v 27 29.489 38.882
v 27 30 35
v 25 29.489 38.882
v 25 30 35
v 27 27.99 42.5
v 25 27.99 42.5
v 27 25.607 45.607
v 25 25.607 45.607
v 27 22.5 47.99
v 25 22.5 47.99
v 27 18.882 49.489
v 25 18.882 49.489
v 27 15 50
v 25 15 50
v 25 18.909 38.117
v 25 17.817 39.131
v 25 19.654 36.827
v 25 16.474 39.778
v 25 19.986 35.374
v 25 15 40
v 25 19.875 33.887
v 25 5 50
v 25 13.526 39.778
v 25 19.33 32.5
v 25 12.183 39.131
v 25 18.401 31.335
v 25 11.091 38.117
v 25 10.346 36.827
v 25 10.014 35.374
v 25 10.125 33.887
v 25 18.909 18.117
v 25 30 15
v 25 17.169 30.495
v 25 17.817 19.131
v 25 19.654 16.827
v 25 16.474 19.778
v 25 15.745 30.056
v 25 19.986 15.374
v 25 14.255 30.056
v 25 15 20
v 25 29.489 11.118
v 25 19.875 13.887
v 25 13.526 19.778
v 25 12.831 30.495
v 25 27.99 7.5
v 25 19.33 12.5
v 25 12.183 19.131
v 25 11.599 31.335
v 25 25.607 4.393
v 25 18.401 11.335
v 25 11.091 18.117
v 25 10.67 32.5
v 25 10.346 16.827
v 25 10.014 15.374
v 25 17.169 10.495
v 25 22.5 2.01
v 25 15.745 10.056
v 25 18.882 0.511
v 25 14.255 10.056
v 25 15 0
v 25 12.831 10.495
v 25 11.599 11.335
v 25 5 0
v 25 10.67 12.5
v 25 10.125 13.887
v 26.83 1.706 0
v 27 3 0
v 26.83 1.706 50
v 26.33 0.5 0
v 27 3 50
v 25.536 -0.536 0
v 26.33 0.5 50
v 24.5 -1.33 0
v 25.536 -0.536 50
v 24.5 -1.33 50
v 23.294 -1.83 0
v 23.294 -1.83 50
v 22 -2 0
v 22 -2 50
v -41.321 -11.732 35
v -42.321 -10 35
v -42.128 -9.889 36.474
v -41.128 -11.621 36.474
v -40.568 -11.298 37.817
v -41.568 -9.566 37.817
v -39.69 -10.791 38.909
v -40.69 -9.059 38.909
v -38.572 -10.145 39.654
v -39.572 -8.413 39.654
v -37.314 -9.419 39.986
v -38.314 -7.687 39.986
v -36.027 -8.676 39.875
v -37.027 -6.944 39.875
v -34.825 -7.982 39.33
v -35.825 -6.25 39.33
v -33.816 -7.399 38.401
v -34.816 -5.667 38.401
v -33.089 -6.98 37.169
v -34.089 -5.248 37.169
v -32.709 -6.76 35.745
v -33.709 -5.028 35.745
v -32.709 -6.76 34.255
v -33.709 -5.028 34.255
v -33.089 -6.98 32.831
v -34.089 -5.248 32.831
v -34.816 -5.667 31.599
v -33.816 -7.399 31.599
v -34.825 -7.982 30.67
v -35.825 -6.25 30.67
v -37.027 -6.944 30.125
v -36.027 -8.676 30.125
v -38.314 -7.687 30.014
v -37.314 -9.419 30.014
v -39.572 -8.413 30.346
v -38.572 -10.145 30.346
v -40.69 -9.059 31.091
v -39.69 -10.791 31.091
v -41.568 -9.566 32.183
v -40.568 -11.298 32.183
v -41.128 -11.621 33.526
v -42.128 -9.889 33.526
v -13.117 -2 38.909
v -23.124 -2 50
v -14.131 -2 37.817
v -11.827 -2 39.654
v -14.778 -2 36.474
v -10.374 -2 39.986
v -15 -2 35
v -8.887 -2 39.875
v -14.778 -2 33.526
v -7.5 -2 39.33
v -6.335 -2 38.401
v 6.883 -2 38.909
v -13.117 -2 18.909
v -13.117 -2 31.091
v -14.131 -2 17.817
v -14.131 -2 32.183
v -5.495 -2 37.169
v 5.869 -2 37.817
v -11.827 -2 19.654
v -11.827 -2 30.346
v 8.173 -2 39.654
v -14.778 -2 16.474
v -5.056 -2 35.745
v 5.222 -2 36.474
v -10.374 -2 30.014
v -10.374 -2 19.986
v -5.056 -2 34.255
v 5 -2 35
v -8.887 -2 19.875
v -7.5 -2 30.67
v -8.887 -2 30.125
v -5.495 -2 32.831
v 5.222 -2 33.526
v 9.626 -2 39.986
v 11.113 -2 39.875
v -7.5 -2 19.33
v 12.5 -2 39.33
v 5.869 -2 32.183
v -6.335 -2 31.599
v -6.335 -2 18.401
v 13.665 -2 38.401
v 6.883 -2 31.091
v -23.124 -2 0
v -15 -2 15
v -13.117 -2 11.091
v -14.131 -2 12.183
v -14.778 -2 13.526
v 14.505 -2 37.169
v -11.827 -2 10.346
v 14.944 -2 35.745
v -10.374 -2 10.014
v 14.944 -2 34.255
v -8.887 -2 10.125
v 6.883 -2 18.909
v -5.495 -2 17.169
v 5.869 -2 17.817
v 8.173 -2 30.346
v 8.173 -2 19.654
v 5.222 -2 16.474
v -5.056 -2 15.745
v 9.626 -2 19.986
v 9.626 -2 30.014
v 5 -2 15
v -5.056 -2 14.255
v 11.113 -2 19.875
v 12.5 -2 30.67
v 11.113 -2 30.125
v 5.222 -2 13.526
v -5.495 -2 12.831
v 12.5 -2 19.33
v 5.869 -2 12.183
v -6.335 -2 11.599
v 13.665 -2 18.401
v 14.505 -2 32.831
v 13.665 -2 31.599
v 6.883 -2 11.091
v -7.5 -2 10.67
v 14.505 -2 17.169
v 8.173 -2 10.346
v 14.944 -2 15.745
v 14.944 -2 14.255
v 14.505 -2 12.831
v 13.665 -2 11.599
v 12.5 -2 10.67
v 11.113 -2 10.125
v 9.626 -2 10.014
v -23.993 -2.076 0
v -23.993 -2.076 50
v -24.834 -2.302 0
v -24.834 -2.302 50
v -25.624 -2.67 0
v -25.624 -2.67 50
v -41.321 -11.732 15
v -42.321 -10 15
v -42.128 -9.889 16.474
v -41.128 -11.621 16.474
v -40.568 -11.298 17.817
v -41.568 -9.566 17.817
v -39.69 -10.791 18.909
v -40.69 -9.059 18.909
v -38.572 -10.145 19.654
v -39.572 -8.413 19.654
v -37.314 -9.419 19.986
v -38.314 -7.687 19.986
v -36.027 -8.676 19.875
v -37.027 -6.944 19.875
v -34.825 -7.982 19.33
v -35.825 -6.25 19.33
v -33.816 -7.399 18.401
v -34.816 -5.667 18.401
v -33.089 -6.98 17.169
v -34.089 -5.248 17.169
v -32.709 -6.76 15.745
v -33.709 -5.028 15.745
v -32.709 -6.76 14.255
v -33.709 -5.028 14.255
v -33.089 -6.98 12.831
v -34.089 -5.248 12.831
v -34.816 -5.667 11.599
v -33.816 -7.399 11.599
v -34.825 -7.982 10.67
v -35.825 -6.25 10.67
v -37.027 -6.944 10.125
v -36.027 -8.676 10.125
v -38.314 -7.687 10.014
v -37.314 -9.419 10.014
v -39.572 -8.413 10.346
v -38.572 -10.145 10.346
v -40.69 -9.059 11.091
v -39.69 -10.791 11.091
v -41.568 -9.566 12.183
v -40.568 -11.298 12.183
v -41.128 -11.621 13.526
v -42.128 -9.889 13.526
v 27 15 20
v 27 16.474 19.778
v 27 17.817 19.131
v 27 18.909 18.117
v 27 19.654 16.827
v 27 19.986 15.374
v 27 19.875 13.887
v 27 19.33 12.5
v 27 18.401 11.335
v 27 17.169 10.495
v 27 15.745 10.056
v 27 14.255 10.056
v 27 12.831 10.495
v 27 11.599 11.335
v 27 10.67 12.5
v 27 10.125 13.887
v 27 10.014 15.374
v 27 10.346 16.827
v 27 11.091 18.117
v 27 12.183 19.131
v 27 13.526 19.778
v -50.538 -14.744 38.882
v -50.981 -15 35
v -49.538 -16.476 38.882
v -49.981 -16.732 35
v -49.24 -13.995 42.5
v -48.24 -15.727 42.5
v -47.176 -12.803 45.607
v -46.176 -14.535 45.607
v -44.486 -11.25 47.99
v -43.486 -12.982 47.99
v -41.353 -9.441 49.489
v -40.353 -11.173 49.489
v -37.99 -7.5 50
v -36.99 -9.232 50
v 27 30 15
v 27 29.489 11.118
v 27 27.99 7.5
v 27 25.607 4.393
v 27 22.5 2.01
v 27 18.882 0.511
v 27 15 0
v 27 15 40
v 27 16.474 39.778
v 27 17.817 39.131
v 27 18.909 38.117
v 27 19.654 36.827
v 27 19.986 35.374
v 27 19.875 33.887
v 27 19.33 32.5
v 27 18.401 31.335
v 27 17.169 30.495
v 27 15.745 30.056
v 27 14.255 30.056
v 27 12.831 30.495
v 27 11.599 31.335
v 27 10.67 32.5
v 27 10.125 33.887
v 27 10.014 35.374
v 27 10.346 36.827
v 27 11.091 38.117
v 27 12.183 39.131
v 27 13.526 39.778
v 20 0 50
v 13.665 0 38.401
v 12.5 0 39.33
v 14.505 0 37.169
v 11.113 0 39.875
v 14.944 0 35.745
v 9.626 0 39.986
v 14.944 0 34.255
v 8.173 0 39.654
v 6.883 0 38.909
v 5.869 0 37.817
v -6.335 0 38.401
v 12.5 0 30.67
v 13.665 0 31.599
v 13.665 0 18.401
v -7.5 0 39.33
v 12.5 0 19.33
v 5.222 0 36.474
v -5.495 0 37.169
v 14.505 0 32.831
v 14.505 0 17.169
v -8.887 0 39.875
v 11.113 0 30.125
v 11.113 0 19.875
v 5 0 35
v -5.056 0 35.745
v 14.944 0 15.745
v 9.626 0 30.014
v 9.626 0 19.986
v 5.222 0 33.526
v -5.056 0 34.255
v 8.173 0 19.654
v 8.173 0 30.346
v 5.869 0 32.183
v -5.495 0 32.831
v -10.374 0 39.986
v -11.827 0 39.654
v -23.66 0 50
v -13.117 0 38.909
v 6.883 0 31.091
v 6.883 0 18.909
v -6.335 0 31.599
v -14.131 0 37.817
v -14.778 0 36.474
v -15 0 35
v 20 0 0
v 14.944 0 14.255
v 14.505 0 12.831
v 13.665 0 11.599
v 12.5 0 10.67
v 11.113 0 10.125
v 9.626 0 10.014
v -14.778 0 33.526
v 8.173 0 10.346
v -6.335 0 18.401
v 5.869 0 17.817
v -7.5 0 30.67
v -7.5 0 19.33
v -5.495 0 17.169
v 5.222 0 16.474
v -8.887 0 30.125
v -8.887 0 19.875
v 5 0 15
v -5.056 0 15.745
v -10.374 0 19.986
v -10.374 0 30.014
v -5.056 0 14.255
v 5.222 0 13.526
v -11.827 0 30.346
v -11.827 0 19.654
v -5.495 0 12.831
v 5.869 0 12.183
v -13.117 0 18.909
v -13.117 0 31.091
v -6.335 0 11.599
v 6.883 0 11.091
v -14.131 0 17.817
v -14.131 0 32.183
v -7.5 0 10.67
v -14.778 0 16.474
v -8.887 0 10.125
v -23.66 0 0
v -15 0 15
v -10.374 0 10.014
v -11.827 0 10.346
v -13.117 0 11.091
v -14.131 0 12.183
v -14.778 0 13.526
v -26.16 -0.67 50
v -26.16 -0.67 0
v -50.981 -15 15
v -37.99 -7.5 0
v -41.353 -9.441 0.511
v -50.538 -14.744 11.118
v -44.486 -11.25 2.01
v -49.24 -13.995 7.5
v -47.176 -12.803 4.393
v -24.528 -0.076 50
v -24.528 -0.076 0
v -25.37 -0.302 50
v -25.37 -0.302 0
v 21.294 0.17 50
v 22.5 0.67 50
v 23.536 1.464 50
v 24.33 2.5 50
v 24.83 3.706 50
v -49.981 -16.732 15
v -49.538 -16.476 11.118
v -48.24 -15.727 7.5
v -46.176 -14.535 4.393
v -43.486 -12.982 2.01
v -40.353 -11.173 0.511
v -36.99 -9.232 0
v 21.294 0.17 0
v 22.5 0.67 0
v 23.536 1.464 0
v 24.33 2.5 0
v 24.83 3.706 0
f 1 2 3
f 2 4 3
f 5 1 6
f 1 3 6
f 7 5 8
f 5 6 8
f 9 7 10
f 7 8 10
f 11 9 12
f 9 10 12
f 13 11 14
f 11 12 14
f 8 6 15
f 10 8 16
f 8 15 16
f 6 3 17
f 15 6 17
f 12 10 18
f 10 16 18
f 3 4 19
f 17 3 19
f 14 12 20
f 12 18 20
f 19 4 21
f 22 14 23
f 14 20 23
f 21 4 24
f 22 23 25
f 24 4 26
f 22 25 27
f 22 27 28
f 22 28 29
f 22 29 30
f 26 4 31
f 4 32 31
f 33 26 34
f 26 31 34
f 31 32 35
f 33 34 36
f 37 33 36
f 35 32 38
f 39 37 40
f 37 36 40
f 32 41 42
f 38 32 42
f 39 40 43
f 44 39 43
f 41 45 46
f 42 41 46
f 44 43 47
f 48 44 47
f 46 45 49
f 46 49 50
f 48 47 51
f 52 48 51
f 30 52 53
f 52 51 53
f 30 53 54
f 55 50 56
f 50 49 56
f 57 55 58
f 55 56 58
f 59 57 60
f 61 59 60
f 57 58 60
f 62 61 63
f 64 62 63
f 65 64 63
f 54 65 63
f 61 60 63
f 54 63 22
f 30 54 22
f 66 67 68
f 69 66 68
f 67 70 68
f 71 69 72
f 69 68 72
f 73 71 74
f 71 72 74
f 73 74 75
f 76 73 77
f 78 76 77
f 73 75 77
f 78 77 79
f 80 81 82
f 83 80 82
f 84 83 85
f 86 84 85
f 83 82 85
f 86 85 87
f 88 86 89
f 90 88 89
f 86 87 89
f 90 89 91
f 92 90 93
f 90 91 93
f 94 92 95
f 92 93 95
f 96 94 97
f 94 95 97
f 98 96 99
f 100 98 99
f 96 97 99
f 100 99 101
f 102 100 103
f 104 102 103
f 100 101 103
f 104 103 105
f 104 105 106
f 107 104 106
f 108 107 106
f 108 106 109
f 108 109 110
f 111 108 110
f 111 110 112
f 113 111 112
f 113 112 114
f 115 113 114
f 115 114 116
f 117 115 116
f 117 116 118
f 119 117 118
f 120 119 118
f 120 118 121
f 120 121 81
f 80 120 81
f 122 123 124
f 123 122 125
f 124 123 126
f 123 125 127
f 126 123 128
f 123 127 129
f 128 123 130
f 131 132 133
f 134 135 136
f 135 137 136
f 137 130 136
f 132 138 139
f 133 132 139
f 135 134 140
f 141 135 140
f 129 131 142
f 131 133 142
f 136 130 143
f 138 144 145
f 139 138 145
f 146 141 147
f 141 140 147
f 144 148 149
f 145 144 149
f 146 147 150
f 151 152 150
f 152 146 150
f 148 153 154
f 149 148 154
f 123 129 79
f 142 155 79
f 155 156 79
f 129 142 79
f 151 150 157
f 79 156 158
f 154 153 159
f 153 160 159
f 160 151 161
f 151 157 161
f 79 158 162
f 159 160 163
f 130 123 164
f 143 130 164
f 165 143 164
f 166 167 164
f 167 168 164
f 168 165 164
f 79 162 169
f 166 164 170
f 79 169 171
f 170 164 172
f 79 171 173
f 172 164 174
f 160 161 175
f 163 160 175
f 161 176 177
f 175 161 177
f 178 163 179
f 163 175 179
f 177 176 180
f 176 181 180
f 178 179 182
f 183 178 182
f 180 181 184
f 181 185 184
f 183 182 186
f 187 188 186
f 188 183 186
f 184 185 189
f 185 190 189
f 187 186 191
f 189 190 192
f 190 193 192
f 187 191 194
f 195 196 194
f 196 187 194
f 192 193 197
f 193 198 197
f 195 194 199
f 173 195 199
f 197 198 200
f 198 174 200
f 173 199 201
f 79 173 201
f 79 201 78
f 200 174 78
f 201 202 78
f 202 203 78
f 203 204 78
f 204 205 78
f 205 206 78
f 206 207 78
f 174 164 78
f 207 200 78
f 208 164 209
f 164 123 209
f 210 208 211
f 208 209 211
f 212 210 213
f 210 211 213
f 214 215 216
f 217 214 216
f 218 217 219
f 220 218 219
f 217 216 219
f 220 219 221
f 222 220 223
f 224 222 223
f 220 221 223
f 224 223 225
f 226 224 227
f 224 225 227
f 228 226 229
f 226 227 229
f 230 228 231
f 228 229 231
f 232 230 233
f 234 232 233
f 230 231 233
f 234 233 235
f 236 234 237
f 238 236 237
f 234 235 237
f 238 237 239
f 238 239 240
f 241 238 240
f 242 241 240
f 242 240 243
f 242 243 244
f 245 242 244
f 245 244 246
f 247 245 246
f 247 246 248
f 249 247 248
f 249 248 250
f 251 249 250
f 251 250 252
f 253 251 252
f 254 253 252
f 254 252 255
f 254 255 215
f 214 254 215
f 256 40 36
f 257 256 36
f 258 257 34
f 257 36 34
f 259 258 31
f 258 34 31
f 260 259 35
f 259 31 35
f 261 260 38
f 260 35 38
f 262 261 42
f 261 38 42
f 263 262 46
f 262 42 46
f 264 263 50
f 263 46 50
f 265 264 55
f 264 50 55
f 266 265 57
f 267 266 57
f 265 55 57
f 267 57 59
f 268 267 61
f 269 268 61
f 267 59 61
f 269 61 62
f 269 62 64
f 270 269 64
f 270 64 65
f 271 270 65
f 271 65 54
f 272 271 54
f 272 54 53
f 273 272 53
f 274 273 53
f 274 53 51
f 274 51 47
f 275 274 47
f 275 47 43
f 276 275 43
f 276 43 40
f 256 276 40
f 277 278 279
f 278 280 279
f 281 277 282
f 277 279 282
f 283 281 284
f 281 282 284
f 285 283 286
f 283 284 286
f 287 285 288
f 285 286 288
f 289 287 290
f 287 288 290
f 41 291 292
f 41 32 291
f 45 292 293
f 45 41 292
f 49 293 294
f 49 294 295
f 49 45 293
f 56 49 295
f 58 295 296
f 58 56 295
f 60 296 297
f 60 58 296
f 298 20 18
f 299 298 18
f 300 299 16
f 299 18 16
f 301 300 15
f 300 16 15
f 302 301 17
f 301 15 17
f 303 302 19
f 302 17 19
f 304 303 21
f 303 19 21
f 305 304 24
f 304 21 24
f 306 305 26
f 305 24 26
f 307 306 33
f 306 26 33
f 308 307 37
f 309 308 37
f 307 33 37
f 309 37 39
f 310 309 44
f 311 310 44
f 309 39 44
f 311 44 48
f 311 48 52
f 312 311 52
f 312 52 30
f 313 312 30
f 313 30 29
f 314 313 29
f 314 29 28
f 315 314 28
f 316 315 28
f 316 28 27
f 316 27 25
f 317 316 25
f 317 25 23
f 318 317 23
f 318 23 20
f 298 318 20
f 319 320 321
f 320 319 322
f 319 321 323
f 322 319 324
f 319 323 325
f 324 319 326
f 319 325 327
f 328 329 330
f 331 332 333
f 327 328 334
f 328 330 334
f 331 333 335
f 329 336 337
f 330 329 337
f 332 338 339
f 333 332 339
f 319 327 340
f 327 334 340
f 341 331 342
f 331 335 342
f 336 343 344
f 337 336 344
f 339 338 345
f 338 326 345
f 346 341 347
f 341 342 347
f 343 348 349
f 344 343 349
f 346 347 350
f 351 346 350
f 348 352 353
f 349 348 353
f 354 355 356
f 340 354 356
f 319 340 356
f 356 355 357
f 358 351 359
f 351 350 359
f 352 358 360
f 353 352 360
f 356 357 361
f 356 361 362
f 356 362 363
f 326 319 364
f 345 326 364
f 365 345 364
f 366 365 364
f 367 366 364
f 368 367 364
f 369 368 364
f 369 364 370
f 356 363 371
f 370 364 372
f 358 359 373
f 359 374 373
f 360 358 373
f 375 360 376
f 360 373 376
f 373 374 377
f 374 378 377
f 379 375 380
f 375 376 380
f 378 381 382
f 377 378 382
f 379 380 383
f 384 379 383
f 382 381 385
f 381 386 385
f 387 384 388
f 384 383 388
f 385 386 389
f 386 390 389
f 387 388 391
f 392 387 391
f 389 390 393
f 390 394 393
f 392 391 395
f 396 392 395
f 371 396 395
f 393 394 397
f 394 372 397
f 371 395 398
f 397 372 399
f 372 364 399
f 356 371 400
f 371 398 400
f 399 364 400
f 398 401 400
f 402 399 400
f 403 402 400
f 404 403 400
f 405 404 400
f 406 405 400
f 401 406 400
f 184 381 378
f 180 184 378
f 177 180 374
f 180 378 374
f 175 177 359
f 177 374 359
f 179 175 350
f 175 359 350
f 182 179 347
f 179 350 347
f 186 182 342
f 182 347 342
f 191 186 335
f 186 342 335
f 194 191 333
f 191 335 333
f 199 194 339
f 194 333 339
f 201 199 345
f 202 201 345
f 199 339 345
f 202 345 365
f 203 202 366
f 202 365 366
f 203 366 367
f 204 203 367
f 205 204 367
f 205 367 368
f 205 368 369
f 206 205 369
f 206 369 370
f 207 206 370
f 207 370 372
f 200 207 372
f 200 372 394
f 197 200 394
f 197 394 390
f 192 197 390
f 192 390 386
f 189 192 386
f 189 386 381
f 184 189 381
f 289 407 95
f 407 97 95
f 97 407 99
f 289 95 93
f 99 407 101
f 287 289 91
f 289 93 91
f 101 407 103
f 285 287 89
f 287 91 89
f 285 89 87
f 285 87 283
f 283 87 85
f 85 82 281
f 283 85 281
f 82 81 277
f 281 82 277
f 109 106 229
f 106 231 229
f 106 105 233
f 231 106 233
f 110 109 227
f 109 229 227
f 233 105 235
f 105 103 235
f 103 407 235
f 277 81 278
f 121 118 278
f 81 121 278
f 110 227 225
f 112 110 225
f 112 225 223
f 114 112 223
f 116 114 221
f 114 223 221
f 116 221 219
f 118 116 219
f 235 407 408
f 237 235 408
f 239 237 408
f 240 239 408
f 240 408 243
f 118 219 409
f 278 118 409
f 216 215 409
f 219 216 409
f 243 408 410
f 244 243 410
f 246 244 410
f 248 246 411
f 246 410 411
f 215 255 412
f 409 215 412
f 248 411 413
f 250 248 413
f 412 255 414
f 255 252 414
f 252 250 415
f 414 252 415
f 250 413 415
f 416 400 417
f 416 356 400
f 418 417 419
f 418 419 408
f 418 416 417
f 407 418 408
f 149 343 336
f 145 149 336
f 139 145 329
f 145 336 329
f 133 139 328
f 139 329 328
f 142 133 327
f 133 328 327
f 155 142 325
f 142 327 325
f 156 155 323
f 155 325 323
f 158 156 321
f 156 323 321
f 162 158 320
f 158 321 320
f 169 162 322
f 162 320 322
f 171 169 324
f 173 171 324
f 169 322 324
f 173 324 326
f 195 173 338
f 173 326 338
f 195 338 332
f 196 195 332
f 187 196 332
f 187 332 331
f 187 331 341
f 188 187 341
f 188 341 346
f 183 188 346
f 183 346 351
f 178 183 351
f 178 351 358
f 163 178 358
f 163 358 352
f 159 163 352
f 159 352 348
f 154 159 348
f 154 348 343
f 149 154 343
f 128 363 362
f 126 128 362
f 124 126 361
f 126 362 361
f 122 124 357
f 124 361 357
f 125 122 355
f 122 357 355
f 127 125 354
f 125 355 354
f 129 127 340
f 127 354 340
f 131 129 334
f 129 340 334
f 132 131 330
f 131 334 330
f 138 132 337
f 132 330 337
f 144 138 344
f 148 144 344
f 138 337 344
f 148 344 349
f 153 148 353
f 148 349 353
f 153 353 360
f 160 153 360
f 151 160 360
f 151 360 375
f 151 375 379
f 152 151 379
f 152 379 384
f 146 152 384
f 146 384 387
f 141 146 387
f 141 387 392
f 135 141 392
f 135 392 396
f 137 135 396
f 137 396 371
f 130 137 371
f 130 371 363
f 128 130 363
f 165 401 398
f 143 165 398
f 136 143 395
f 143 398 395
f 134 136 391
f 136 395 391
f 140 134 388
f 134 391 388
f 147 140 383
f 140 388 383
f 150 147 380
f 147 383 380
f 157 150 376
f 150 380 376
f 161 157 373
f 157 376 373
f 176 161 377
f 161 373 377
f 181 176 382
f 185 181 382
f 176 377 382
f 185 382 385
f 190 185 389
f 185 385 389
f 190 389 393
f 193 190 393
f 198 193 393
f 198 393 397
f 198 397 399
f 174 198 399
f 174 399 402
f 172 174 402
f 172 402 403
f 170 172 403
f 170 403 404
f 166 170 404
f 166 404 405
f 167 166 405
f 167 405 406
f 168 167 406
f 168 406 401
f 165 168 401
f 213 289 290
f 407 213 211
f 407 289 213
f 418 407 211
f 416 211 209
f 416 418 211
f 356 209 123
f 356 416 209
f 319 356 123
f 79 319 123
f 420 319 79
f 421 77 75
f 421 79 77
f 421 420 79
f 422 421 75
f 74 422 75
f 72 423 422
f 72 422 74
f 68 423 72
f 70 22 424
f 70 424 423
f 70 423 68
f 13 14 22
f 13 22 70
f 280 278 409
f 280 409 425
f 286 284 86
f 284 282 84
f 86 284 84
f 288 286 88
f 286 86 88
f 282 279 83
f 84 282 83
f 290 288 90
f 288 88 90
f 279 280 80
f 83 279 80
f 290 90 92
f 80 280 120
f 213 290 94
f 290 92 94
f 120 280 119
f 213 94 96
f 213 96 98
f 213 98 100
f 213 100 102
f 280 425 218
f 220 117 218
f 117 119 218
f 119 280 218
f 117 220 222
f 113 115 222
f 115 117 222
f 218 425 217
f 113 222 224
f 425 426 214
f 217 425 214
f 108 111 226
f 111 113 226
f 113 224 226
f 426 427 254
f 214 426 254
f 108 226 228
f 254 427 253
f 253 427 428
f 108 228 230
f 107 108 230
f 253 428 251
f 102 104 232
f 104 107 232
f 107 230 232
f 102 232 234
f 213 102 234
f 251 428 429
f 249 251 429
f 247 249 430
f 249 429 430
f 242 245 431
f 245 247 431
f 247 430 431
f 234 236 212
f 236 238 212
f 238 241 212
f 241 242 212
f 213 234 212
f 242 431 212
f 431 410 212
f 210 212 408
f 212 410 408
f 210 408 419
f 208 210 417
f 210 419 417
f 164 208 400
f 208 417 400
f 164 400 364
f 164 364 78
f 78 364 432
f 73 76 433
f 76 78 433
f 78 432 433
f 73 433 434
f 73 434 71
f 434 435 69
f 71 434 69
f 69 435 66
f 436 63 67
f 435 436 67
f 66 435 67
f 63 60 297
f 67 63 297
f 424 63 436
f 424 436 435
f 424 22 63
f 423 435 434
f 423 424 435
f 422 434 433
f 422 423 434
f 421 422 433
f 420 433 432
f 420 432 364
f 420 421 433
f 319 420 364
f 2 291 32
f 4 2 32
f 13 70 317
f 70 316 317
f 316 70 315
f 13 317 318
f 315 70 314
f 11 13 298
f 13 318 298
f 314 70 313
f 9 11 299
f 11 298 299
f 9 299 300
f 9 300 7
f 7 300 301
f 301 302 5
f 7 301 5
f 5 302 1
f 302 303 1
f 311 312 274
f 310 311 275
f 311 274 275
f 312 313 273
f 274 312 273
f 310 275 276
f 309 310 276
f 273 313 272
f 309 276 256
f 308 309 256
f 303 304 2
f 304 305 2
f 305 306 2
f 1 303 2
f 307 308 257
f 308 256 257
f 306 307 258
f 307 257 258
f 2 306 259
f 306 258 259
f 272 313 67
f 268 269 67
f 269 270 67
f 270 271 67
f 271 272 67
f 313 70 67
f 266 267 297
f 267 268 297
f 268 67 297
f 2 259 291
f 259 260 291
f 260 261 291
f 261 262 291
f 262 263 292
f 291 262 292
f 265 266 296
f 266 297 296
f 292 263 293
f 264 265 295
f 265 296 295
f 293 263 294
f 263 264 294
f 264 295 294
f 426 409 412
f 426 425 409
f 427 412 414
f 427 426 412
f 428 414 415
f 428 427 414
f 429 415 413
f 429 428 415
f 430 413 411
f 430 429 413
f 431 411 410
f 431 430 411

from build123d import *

# Parameters (mm, degrees)
EXTRUDE_THIN1_DEPTH  = 50
FILLET1_R            = 15
CUT_EXTRUDE1_REACH   = 79.453
SKETCH2_R            = 5
LPATTERN1_COUNT      = 2
LPATTERN1_PITCH      = 20
LPATTERN1_COUNT_DIR2 = 2
LPATTERN1_PITCH_DIR2 = 20
CUT_EXTRUDE2_REACH   = 74.528
SKETCH3_R            = 5
SKETCH4_R            = 5
CUT_EXTRUDE3_DEPTH   = 96.776177682
LPATTERN2_COUNT      = 2
LPATTERN2_PITCH      = 20
FILLET2_R            = 5


with BuildPart() as part:
    # Sketch1 → Extrude-Thin1 (new body)
    with BuildSketch(Plane.XY):
        Polygon((25, 30), (25, 0), (-25, 0), (-50.980762114, -15), (-49.980762114, -16.732050808), (-24.464101615, -2), (27, -2), (27, 30), align=None)
    extrude(amount=EXTRUDE_THIN1_DEPTH)

    # Fillet1
    fillet1_edges = [part.edges().sort_by_distance(p)[0] for p in [
        (-50.480762114, -15.866025404, 50),
        (-50.480762114, -15.866025404, 0),
        (26, 30, 50),
        (26, 30, 0),
    ]]
    fillet(fillet1_edges, radius=FILLET1_R)

    # Sketch2 → Cut-Extrude1 (cut, up to next)
    with BuildSketch(Plane(origin=(0, 0, 0), x_dir=(1, 0, 0), z_dir=(0, 1, 0)), mode=Mode.PRIVATE) as cut_extrude1_sk1:
        with Locations(Location((-10, -15, 0), (0, 0, 180))):
            Circle(SKETCH2_R)
    cut_extrude1_tool1 = extrude(cut_extrude1_sk1.sketch, amount=-CUT_EXTRUDE1_REACH, mode=Mode.PRIVATE) & part.part
    cut_extrude1 = cut_extrude1_tool1.solids().sort_by_distance((-10, 0, 15))[0]
    add(cut_extrude1, mode=Mode.SUBTRACT)

    # LPattern1: Cut-Extrude1 2 × 2
    with Locations(*[(j * LPATTERN1_PITCH_DIR2, 0, i * LPATTERN1_PITCH) for i in range(LPATTERN1_COUNT) for j in range(LPATTERN1_COUNT_DIR2) if (i, j) != (0, 0)]):
        add(cut_extrude1, mode=Mode.SUBTRACT)

    # Sketch3 → Cut-Extrude2 (cut, up to next)
    with BuildSketch(Plane(origin=(-6.25, 10.825317547, 0), x_dir=(0.8660254037844379, 0.5000000000000013, 0), z_dir=(-0.5000000000000013, 0.8660254037844379, 0)), mode=Mode.PRIVATE) as cut_extrude2_sk1:
        with Locations(Location((-36.650635095, -15, 0), (0, 0, 180))):
            Circle(SKETCH3_R)
    cut_extrude2_tool1 = extrude(cut_extrude2_sk1.sketch, amount=-CUT_EXTRUDE2_REACH, mode=Mode.PRIVATE) & part.part
    # Sketch3 → Cut-Extrude2 (cut, up to next)
    with BuildSketch(Plane(origin=(-6.25, 10.825317547, 0), x_dir=(0.8660254037844379, 0.5000000000000013, 0), z_dir=(-0.5000000000000013, 0.8660254037844379, 0)), mode=Mode.PRIVATE) as cut_extrude2_sk2:
        with Locations(Location((-36.650635095, -35, 0), (0, 0, 180))):
            Circle(SKETCH3_R)
    cut_extrude2_tool2 = extrude(cut_extrude2_sk2.sketch, amount=-CUT_EXTRUDE2_REACH, mode=Mode.PRIVATE) & part.part
    add(cut_extrude2_tool1.solids().sort_by_distance((-37.990381, -7.5, 15))[0], mode=Mode.SUBTRACT)
    add(cut_extrude2_tool2.solids().sort_by_distance((-37.990381, -7.5, 35))[0], mode=Mode.SUBTRACT)

    # Sketch4 → Cut-Extrude3 (cut, through all)
    with BuildSketch(Plane.ZY.offset(-25)):
        with Locations((15, 15)):
            Circle(SKETCH4_R)
    cut_extrude3 = extrude(amount=-CUT_EXTRUDE3_DEPTH, mode=Mode.SUBTRACT)

    # LPattern2: Cut-Extrude3 ×2
    with Locations(*[(0, 0, i * LPATTERN2_PITCH) for i in range(1, LPATTERN2_COUNT)]):
        add(cut_extrude3, mode=Mode.SUBTRACT)

    # Fillet2
    fillet2_edges = [part.edges().sort_by_distance(p)[0] for p in [
        (27, -2, 25),
        (-24.464101615, -2, 25),
        (-25, 0, 25),
        (25, 0, 25),
    ]]
    fillet(fillet2_edges, radius=FILLET2_R)


solid = part.part
